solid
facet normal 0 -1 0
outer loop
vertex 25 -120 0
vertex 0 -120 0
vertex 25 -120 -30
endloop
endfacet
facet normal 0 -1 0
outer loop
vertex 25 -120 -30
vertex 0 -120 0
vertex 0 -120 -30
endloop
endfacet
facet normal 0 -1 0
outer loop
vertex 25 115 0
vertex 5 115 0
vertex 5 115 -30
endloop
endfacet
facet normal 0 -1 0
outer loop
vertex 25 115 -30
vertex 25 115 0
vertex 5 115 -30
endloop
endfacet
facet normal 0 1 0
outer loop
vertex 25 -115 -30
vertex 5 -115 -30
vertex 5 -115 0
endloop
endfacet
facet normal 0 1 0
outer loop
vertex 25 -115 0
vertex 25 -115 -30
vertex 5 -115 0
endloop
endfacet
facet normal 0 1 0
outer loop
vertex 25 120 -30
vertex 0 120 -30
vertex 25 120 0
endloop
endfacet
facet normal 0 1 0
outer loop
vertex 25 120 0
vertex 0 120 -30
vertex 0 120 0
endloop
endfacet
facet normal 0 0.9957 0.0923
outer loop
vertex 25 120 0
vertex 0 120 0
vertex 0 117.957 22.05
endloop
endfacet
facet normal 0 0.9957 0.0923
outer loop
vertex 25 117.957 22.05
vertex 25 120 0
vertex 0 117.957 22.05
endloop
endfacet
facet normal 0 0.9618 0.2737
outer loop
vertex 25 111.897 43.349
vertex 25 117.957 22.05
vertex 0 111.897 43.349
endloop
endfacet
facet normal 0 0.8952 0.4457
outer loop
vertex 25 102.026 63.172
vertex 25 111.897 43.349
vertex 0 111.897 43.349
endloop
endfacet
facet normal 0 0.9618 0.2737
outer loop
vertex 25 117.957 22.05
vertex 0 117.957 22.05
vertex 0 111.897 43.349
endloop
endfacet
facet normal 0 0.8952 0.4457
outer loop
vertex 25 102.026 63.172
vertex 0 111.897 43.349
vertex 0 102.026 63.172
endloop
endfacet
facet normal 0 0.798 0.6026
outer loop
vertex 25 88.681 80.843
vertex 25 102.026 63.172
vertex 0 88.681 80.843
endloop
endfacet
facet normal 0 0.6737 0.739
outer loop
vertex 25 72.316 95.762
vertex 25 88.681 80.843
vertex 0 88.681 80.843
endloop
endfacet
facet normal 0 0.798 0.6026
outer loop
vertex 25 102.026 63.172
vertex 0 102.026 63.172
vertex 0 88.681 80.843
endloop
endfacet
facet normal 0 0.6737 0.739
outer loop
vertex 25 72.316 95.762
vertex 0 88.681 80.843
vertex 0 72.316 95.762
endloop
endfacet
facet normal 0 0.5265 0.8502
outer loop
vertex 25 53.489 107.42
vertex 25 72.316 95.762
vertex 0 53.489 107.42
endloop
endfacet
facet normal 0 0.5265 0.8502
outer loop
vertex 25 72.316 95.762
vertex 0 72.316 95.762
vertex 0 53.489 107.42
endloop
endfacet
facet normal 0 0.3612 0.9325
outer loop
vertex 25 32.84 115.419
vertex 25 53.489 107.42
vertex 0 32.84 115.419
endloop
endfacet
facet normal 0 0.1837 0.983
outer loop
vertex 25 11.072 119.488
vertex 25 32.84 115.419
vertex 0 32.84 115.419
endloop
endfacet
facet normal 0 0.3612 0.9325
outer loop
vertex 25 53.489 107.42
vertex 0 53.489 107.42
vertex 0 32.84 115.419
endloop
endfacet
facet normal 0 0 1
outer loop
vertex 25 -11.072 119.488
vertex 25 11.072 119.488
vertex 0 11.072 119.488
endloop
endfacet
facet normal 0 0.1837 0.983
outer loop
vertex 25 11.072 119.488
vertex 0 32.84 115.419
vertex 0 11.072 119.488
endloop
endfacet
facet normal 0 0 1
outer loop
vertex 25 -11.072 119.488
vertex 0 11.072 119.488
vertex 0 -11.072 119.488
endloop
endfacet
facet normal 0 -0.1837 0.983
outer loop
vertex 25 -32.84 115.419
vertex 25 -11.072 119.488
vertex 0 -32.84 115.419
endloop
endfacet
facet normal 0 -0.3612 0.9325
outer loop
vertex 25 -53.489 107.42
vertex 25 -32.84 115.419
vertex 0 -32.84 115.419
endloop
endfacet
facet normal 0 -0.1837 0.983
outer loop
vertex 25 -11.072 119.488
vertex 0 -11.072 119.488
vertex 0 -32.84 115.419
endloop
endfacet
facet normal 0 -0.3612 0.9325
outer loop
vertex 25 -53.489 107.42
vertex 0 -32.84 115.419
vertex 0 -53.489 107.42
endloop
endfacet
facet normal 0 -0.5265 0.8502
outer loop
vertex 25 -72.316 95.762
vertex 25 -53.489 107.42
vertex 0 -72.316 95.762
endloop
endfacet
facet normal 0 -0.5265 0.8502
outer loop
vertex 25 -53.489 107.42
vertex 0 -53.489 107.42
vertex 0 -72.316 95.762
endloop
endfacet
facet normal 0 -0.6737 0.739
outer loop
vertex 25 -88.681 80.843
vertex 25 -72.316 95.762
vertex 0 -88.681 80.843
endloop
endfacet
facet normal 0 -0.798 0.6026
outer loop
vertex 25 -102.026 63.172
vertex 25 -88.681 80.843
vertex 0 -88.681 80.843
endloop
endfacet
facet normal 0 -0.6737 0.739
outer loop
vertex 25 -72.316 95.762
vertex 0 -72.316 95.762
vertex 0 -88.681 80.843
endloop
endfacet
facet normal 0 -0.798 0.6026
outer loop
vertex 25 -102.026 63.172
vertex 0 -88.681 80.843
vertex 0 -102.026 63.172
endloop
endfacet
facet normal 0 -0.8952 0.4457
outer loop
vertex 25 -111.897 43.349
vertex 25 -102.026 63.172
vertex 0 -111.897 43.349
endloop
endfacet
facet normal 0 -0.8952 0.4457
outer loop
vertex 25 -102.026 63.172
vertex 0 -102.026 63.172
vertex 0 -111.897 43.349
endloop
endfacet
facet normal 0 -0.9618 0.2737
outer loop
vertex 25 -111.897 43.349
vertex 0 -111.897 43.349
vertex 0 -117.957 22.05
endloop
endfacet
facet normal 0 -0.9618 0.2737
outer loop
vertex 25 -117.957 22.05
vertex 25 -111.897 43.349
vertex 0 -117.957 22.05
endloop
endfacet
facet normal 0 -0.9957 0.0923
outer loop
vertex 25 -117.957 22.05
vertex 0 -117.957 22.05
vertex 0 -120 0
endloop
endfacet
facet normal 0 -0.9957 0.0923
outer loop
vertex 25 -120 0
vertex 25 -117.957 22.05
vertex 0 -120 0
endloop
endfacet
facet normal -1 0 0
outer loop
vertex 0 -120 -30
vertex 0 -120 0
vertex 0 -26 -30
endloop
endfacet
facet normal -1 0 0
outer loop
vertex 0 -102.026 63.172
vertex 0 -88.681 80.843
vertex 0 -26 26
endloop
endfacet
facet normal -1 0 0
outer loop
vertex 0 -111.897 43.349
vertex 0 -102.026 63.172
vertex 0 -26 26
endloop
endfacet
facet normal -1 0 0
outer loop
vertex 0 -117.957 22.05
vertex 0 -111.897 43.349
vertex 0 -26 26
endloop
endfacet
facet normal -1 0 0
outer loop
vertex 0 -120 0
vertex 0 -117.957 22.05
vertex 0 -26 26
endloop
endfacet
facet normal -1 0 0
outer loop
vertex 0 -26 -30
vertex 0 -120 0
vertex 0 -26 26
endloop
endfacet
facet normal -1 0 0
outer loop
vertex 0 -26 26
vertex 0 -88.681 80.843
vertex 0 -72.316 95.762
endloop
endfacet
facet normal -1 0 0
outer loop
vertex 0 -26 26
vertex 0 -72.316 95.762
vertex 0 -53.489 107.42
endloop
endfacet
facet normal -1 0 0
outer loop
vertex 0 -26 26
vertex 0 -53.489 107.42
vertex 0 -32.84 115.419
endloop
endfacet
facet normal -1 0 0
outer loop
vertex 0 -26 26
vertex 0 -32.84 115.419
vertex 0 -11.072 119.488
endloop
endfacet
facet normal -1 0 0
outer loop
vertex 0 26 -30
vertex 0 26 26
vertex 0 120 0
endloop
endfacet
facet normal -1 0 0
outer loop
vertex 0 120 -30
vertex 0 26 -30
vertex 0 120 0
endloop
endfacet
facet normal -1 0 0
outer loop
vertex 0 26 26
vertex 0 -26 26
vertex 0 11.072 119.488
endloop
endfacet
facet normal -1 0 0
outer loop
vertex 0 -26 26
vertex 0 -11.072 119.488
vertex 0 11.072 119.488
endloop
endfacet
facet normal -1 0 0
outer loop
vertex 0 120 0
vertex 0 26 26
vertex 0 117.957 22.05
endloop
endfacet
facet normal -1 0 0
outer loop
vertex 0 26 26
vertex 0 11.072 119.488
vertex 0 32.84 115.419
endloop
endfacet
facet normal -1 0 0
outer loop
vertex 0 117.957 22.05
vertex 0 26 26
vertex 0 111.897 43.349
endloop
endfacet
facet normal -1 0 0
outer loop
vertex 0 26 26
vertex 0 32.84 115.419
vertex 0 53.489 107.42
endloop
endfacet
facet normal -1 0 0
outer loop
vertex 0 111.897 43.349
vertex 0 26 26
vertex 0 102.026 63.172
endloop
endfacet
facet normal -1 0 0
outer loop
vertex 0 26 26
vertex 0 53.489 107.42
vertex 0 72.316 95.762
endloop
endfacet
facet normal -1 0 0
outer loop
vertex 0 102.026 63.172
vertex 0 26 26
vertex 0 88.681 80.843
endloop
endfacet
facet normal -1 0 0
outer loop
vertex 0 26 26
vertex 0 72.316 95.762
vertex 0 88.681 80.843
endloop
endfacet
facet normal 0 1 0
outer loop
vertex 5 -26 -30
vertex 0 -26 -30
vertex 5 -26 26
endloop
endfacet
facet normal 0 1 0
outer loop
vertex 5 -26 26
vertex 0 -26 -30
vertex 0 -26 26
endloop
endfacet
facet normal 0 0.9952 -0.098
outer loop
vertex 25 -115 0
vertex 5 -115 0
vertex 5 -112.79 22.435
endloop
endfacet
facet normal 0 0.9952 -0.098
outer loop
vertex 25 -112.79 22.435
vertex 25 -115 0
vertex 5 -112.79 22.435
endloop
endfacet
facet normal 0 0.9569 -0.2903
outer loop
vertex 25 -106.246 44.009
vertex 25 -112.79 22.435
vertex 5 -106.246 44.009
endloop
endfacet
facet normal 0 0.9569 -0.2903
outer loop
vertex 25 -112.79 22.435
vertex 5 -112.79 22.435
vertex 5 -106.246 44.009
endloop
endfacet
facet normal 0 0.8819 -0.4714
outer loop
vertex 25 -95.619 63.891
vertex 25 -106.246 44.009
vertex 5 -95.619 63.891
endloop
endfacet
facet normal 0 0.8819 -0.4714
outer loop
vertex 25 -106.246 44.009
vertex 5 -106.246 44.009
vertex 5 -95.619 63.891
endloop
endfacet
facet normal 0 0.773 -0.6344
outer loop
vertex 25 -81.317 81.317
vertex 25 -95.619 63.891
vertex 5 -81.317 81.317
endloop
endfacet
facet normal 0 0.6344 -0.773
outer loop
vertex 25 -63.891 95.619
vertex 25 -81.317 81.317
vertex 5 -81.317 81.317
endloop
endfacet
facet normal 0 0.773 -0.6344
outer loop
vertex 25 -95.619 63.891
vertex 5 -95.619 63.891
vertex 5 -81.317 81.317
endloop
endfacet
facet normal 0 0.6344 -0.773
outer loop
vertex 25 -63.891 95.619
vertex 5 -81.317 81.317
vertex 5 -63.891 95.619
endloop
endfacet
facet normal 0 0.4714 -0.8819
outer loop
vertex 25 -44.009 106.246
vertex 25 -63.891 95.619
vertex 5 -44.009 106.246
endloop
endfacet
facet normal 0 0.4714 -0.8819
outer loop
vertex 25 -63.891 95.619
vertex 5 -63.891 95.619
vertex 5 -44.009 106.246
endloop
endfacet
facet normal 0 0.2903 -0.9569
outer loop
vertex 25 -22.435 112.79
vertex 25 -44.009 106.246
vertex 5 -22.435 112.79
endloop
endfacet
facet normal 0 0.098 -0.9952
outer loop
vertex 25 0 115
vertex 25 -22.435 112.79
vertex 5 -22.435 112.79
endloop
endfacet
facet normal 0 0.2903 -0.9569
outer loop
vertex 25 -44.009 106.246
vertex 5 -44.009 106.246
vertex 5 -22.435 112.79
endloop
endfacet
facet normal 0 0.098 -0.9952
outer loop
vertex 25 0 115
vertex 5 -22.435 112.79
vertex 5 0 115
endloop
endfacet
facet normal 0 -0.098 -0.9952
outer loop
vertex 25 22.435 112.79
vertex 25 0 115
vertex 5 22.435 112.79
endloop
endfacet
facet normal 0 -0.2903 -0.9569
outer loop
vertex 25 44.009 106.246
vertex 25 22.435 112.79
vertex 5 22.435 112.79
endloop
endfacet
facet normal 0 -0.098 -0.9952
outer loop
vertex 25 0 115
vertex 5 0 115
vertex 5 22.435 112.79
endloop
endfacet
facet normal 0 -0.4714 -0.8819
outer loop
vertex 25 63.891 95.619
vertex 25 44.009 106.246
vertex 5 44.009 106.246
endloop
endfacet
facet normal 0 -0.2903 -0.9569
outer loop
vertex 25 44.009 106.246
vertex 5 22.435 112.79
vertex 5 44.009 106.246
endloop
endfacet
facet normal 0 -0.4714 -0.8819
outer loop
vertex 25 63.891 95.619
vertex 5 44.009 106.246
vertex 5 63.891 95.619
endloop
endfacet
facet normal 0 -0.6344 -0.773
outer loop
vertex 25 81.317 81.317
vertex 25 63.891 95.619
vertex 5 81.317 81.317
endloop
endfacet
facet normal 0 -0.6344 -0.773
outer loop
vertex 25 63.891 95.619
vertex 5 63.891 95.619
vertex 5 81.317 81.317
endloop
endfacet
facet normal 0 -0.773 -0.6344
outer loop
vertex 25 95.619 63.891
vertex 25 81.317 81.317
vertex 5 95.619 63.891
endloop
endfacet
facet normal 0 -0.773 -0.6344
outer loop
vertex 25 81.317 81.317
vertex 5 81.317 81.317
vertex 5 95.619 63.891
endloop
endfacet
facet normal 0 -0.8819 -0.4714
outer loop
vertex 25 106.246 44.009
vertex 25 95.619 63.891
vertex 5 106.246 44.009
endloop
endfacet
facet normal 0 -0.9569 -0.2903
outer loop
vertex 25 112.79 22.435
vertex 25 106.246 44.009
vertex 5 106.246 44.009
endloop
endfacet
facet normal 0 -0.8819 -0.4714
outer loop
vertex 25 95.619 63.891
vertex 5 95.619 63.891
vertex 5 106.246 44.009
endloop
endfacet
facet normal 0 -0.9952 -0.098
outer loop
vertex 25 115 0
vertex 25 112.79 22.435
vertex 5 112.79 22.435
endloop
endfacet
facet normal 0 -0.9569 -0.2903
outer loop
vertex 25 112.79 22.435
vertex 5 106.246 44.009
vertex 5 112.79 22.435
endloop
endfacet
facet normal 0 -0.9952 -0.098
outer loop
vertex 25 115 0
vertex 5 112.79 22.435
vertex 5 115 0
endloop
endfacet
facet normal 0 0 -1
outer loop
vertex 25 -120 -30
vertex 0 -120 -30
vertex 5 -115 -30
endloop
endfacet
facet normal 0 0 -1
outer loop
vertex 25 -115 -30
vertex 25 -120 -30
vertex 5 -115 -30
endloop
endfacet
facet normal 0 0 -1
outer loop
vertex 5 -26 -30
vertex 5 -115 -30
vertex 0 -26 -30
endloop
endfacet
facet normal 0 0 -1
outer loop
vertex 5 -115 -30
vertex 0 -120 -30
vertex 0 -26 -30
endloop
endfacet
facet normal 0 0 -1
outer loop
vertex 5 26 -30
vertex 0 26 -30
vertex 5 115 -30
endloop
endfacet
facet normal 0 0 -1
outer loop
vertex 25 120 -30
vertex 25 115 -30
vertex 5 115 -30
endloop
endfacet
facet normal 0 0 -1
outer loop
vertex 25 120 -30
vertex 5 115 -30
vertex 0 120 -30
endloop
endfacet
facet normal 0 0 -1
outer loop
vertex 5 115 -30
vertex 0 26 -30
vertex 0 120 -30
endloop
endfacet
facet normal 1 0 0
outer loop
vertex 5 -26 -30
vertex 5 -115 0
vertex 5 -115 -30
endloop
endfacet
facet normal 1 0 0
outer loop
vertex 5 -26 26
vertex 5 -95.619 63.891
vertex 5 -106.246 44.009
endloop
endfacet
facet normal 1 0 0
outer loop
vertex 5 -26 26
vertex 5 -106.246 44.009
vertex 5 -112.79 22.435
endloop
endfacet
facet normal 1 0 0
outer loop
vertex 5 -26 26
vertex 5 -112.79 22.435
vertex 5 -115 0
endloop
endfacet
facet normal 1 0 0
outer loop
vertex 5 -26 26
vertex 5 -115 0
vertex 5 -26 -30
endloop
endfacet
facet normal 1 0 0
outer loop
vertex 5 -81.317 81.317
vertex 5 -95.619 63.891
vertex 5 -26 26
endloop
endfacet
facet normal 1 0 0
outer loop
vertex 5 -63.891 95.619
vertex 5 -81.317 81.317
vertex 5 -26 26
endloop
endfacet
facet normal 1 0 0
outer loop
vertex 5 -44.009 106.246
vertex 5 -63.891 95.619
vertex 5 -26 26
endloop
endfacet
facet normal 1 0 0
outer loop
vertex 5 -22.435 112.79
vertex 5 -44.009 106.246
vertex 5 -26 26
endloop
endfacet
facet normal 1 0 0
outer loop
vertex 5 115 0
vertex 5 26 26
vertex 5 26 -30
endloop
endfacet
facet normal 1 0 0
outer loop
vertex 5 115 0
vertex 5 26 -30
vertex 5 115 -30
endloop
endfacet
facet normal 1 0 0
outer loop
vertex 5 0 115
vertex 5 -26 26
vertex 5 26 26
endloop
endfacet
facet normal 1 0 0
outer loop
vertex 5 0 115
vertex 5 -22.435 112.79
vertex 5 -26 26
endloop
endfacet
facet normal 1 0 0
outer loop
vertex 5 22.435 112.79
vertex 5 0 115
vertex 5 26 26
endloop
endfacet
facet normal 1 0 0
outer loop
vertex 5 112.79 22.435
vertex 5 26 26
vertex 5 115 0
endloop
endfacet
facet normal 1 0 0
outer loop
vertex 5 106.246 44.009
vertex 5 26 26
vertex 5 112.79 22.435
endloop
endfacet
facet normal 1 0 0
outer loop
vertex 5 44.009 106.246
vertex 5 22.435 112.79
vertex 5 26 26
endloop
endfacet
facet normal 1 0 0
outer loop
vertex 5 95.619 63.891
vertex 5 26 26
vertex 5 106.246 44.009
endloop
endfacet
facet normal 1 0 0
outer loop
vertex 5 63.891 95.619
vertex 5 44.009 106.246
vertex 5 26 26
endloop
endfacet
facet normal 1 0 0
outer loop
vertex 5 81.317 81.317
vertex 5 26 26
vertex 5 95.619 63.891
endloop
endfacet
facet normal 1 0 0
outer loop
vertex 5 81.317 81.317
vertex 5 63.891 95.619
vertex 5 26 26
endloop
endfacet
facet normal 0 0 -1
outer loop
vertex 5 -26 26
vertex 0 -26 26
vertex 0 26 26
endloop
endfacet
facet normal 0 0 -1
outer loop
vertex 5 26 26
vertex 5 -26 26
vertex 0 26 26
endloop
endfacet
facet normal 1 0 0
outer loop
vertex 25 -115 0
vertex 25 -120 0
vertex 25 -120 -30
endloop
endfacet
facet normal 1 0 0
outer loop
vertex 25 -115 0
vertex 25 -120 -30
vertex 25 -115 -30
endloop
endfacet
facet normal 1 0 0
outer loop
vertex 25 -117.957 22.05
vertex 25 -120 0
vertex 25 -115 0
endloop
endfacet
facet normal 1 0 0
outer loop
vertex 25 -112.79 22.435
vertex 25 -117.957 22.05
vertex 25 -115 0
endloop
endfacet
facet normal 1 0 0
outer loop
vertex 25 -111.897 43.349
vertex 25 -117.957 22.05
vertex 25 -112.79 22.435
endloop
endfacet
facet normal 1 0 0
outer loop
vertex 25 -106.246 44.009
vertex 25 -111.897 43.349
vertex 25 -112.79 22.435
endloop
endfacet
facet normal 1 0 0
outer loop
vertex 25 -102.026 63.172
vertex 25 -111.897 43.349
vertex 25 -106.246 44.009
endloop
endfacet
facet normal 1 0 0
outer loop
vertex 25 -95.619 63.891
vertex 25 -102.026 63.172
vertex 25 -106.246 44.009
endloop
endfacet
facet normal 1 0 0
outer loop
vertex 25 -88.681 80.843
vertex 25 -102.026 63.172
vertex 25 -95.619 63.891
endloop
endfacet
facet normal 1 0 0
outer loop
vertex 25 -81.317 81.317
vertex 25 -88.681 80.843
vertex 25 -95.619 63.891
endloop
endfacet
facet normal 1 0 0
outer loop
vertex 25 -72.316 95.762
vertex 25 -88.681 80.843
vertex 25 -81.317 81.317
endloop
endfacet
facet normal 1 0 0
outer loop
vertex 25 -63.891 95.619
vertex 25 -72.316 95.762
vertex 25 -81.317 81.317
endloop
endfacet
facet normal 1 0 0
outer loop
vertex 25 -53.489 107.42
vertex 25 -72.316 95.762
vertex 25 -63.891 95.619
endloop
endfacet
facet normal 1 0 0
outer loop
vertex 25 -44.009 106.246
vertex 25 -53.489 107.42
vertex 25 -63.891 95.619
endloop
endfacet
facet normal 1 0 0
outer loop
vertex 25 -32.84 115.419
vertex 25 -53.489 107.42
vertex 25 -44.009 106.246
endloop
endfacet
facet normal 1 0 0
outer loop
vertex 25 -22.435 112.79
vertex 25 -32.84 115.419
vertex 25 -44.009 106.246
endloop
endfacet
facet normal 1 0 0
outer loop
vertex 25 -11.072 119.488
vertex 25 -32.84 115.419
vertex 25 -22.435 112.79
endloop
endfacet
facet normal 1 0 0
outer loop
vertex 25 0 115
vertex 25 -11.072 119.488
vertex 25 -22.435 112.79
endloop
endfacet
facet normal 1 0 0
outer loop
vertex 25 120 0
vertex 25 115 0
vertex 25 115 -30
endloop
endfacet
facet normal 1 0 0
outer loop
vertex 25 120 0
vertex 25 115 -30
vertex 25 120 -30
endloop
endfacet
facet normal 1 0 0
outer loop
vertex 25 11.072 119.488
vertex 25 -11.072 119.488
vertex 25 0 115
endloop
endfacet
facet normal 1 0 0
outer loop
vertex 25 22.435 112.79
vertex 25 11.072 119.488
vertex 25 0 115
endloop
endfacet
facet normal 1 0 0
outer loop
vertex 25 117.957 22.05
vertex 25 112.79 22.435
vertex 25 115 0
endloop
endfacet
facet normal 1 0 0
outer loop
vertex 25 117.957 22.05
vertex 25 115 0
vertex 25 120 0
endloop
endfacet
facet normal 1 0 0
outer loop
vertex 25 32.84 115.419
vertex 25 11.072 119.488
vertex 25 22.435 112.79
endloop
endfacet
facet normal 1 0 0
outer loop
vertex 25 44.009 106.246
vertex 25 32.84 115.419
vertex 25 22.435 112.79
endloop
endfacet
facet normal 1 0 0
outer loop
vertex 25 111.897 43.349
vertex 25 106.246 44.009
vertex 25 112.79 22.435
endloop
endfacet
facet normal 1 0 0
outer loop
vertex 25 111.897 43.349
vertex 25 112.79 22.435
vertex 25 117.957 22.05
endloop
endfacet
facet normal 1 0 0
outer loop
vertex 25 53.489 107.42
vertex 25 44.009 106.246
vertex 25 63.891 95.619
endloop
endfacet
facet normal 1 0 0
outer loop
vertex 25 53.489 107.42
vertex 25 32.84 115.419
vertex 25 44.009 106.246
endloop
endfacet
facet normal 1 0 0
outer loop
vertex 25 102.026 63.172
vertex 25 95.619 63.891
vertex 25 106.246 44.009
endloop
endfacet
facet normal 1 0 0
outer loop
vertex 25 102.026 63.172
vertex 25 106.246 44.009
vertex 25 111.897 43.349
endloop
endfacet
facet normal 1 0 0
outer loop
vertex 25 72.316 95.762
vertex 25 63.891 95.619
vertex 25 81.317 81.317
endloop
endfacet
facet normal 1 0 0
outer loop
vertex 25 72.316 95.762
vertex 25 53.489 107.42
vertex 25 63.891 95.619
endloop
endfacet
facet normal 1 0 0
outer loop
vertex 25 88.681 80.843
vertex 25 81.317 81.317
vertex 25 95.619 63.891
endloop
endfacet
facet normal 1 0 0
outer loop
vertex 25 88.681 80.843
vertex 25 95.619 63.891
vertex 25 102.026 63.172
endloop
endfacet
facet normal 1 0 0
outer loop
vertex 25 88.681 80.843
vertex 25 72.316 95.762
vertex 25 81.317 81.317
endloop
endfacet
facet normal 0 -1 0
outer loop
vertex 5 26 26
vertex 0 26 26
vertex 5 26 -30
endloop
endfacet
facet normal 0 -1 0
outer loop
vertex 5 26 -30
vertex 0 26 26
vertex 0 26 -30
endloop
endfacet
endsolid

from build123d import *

# Parameters (mm, degrees)
F1_DEPTH = 5
F2_DEPTH = 25


with BuildPart() as f1:
    # F0 (on Right) → F1 (new body)
    with BuildSketch(Plane.YZ):
        with BuildLine():
            Line((115, -30), (115, 0))
            ThreePointArc((115, 0), (0, 115), (-115, 0))
            Line((-115, 0), (-115, -30))
            Line((-115, -30), (-26, -30))
            Line((-26, -30), (-26, 26))
            Line((-26, 26), (0, 26))
            Line((0, 26), (26, 26))
            Line((26, 26), (26, -30))
            Line((26, -30), (115, -30))
        make_face()
    extrude(amount=F1_DEPTH)

    # F0 (on Right) → F2 (join)
    with BuildSketch(Plane.YZ):
        with BuildLine():
            ThreePointArc((-115, 0), (0, 115), (115, 0))
            Line((115, 0), (115, -30))
            Line((115, -30), (116.1895, -30))
            Line((116.1895, -30), (120, -30))
            Line((120, -30), (120, 0))
            ThreePointArc((120, 0), (0, 120), (-120, 0))
            Line((-120, 0), (-120, -30))
            Line((-120, -30), (-115, -30))
            Line((-115, -30), (-115, 0))
        make_face()
    extrude(amount=F2_DEPTH)


solid = f1.part
